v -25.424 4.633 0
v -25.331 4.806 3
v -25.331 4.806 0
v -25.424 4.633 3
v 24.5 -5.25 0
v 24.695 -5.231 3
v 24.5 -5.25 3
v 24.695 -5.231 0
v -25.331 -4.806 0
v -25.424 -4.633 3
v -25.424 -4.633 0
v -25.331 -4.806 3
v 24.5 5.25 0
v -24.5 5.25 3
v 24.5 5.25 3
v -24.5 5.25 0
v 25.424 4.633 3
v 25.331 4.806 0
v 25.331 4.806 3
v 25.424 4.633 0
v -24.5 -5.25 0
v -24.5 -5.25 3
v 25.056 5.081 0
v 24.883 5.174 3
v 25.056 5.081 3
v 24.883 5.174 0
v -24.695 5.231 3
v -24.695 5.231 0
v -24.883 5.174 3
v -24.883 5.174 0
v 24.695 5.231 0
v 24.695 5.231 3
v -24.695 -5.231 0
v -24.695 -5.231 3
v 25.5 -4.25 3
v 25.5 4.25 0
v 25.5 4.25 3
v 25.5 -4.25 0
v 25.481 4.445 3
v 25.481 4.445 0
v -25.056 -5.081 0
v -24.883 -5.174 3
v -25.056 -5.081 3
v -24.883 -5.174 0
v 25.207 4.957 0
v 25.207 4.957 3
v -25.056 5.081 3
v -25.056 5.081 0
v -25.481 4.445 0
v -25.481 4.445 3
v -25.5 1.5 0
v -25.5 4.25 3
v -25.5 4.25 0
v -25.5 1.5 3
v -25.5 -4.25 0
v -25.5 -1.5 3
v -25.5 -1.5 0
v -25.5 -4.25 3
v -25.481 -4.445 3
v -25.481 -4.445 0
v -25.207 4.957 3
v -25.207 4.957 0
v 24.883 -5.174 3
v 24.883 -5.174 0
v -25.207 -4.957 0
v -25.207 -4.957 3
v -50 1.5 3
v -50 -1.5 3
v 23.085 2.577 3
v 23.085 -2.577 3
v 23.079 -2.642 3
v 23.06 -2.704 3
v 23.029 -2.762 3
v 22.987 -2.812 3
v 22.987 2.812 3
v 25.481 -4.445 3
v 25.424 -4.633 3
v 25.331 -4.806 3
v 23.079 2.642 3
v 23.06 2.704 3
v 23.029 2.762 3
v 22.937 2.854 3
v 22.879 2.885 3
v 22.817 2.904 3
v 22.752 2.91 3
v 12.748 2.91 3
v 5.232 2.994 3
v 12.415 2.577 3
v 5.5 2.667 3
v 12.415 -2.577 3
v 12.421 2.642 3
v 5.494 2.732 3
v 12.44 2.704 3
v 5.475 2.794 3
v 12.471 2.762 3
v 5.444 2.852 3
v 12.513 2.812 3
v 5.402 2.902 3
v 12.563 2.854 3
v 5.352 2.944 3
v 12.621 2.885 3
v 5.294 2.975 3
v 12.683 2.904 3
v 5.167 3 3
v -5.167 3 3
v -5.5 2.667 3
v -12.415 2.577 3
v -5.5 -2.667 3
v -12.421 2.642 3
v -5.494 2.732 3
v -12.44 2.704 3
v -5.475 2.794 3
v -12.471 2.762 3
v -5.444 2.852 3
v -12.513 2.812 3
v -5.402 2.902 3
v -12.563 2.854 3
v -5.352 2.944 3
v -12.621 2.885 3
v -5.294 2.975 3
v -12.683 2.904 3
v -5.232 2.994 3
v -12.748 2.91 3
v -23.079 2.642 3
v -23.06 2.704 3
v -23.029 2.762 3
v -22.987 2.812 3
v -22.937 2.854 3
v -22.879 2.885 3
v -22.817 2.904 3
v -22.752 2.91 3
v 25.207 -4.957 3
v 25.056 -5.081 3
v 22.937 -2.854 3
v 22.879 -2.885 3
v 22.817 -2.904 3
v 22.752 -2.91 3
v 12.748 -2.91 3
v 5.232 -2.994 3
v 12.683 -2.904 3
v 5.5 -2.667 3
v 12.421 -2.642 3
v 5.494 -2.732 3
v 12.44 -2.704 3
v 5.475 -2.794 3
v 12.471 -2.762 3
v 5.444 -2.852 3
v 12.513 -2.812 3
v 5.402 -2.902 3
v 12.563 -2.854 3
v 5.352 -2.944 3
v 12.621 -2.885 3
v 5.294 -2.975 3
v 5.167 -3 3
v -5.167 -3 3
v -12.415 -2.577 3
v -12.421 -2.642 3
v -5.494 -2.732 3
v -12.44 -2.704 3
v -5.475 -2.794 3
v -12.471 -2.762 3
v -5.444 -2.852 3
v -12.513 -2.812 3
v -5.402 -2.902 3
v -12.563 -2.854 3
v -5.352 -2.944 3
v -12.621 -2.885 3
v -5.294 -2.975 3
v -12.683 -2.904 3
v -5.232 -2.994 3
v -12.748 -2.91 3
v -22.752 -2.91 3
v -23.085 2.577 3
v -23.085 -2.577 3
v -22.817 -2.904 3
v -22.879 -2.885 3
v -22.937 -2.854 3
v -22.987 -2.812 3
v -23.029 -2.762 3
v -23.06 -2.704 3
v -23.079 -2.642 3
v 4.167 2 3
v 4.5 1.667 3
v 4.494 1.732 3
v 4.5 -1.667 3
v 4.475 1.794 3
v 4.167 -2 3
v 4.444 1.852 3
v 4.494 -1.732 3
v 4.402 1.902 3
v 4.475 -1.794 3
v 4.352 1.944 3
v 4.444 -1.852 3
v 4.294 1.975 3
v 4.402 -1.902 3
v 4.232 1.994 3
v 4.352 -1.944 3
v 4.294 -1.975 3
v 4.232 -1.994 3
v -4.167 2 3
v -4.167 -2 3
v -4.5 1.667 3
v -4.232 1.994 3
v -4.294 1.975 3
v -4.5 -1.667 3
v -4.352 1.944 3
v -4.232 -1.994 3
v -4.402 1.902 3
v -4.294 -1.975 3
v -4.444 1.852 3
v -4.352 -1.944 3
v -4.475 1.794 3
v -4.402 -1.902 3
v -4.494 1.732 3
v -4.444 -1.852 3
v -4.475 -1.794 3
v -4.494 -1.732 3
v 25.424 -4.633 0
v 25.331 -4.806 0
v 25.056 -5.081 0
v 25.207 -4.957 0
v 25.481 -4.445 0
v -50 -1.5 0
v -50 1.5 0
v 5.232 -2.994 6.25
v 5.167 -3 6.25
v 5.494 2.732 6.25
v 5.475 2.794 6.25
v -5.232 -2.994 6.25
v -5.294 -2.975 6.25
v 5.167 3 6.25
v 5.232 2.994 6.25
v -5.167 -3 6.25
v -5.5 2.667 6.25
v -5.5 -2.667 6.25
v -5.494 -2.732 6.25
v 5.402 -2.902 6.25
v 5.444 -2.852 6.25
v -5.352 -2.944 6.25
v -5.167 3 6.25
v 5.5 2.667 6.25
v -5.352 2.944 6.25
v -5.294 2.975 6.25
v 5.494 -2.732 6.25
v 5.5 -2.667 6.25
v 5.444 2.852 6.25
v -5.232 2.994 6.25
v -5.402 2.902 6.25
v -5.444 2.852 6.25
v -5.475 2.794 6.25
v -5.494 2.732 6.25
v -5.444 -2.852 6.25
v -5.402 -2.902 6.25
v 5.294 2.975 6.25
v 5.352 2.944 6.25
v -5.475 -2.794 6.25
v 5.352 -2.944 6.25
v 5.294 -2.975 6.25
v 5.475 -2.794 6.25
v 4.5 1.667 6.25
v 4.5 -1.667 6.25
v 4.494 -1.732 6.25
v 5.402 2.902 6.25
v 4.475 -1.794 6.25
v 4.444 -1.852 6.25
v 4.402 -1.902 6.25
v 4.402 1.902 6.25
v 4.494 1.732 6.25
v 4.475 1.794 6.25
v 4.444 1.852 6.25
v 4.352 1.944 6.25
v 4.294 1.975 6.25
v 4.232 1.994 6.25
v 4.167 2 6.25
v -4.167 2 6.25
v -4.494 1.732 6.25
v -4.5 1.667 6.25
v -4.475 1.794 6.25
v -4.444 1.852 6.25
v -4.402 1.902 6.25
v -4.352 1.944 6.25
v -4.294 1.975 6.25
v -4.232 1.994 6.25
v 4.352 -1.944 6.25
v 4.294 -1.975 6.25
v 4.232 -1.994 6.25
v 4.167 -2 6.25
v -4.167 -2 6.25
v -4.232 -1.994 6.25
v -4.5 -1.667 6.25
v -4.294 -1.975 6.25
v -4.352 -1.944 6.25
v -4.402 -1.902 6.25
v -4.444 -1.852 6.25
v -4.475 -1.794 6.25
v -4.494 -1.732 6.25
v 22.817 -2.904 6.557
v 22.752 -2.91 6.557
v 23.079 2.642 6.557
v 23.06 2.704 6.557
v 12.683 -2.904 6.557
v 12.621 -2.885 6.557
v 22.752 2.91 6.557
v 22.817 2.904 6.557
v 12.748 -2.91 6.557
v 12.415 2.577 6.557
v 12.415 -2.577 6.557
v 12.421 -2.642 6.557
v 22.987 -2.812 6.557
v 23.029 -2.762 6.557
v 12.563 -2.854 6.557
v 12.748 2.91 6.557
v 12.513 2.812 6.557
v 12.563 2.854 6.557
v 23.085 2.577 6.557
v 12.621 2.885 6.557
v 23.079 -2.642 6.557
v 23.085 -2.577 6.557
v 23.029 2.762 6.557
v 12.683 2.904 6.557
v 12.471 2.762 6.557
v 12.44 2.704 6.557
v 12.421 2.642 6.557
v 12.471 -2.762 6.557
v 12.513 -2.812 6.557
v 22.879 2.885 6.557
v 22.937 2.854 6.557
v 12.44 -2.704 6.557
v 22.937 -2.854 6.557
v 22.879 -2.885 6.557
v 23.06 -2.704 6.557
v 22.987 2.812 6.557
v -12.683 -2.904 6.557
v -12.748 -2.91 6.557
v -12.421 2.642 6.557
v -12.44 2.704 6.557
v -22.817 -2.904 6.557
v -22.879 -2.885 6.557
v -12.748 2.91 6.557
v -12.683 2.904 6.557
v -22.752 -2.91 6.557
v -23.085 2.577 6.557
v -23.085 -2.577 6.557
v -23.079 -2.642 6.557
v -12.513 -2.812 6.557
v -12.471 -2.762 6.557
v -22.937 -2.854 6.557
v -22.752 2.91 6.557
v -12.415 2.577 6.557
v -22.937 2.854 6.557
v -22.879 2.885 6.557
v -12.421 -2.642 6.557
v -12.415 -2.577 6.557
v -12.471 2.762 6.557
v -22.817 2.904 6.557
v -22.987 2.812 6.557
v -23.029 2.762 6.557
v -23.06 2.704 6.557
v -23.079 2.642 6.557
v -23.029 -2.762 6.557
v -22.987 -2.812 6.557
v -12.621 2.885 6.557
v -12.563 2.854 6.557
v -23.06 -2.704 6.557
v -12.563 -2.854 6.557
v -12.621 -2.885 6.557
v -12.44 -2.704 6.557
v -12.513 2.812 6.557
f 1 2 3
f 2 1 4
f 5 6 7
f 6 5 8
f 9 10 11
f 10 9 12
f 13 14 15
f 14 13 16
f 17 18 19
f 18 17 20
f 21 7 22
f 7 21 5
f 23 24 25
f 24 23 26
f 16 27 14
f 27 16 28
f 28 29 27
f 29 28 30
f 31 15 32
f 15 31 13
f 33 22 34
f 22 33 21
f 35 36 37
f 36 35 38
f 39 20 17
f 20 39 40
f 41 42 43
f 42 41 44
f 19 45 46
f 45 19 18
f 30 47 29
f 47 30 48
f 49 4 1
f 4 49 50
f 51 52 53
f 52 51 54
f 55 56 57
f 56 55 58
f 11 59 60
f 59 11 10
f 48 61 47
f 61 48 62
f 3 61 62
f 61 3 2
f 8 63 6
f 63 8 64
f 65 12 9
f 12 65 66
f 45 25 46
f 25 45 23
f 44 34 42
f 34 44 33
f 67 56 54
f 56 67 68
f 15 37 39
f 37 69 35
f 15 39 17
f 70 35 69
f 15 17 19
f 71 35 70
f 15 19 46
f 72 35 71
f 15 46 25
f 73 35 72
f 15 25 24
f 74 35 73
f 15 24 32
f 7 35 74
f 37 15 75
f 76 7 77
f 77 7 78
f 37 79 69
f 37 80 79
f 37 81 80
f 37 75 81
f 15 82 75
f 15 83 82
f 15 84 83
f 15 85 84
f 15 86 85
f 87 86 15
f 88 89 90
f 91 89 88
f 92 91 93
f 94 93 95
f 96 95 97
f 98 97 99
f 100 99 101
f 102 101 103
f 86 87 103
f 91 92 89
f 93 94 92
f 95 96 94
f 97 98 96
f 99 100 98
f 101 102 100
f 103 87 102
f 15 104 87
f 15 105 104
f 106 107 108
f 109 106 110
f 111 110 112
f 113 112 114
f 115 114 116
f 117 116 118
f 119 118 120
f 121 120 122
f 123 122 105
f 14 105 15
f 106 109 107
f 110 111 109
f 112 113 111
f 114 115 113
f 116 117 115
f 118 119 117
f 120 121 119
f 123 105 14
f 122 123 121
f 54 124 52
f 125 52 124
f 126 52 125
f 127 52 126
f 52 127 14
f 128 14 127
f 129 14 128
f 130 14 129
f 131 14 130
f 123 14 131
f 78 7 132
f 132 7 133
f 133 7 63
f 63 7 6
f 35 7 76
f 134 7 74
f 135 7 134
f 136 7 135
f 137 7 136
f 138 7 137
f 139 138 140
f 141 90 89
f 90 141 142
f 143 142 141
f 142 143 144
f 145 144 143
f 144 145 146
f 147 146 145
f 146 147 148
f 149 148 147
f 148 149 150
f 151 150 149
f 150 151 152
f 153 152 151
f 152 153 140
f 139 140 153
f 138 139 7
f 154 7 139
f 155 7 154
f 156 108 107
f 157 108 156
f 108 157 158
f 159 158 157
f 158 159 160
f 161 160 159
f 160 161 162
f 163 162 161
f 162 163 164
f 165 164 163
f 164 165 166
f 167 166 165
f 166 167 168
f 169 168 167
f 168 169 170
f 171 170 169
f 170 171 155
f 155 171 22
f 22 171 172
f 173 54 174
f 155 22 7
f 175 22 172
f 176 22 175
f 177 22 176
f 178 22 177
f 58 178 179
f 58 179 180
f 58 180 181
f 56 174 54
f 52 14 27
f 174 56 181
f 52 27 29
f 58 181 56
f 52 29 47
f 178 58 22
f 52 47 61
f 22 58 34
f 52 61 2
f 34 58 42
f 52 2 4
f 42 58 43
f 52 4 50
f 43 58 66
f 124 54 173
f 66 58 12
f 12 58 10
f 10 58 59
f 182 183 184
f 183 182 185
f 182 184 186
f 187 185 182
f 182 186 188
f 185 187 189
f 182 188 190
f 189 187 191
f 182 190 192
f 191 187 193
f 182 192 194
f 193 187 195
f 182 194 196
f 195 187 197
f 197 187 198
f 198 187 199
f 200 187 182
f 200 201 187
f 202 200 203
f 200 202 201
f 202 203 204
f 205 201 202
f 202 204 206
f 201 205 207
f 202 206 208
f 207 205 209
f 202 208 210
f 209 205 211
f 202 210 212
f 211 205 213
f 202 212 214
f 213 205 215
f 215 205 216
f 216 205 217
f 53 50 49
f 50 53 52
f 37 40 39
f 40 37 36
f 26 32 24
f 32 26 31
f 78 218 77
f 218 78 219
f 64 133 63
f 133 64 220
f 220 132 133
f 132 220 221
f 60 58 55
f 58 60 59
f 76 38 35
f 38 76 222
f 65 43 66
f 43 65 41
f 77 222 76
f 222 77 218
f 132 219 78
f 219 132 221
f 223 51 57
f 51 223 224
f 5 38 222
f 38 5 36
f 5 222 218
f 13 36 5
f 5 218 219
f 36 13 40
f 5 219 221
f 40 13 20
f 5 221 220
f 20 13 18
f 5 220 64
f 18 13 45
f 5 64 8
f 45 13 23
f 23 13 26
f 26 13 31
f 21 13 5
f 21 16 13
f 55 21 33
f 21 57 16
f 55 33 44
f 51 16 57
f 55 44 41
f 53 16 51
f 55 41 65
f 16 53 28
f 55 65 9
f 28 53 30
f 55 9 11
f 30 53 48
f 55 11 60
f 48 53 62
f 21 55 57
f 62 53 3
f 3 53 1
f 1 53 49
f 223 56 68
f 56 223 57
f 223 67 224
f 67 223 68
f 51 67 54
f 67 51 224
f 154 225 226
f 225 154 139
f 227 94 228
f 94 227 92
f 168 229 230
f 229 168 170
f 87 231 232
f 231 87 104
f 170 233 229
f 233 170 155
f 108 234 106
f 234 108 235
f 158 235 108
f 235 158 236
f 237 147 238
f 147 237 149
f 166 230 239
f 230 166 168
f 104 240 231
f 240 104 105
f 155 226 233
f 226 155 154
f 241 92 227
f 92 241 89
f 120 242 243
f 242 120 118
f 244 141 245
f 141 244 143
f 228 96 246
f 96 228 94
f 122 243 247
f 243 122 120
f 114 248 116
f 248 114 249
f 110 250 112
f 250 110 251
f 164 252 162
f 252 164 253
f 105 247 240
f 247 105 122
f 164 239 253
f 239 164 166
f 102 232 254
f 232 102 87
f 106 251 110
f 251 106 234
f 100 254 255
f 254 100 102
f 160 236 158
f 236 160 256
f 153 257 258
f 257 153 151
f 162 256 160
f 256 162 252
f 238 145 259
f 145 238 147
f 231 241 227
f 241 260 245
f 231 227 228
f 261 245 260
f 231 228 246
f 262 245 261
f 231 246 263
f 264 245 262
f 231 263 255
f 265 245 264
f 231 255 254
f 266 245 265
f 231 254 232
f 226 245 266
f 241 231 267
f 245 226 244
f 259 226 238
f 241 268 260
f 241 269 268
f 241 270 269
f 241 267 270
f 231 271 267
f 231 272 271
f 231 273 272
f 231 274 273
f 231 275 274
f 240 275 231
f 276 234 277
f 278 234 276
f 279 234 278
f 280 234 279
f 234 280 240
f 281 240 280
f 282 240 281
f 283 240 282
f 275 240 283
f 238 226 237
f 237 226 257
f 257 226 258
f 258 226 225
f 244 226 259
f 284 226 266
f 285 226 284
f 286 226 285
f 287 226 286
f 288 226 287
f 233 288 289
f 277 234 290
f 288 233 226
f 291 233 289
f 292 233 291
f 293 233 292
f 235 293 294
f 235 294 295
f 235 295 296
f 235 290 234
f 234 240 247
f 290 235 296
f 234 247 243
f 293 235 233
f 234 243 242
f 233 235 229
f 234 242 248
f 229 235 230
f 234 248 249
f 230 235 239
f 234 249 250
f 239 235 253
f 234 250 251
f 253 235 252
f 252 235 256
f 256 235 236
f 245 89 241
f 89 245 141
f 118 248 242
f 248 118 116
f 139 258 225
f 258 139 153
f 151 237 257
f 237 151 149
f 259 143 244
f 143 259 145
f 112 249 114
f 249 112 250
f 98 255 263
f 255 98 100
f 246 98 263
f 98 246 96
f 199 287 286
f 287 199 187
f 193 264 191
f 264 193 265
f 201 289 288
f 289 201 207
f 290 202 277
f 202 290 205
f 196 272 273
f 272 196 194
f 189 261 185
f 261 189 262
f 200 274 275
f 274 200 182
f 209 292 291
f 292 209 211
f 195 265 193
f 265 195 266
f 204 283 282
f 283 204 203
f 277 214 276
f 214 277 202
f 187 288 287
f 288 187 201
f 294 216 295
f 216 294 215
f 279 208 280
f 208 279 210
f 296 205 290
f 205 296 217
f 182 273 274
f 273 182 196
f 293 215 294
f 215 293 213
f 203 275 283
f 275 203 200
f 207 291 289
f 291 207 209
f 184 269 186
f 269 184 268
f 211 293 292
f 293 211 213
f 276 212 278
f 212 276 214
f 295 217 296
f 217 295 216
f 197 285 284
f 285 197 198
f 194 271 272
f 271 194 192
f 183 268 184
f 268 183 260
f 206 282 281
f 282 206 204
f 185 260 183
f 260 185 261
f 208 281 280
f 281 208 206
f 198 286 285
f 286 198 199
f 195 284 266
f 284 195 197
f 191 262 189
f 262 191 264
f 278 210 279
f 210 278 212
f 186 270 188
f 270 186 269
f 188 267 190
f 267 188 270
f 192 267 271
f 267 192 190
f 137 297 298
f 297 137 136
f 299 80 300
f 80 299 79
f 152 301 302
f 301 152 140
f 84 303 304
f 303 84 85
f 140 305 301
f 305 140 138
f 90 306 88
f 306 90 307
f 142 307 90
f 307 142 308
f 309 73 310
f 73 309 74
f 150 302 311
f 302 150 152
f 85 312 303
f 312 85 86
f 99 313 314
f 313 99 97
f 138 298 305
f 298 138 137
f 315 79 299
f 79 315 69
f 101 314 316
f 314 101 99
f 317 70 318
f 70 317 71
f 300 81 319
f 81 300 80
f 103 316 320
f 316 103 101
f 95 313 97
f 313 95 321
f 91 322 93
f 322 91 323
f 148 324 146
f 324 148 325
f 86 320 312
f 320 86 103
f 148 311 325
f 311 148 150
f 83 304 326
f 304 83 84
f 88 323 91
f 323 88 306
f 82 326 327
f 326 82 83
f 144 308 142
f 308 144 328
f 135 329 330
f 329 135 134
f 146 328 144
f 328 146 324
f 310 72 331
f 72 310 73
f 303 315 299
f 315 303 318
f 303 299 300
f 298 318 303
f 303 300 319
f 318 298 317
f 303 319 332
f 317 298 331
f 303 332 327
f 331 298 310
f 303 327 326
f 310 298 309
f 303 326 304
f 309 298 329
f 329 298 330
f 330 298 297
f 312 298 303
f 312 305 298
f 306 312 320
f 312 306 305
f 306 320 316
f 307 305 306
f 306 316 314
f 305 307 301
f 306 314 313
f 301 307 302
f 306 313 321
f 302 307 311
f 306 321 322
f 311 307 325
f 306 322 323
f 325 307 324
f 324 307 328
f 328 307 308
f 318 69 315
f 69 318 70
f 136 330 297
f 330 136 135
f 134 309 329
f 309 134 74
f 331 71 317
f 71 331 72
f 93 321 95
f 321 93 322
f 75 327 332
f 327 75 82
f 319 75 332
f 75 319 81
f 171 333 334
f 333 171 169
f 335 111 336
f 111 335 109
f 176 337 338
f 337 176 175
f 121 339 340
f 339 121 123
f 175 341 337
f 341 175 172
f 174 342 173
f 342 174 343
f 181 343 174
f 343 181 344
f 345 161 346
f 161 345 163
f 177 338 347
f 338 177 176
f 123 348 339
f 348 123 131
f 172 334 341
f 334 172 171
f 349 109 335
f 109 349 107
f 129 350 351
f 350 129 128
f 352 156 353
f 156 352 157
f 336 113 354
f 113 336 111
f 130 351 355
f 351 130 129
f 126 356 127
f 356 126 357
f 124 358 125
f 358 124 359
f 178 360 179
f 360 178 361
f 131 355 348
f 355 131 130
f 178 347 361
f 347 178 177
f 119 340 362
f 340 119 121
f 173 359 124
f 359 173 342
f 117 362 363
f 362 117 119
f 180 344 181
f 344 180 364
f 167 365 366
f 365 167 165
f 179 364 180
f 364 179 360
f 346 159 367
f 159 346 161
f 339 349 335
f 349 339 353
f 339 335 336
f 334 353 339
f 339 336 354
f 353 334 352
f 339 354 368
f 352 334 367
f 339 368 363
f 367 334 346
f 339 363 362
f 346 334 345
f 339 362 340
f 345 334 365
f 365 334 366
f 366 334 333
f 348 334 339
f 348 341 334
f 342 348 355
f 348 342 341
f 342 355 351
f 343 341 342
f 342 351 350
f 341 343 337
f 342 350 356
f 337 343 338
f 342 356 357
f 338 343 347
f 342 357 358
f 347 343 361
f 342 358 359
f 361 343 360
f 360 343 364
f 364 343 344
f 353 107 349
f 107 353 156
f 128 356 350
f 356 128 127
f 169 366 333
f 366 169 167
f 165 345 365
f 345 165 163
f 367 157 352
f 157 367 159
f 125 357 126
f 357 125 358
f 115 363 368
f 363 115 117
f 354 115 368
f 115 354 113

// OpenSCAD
// file: rounded.scad
//
// Copyright (c) Stewart H. Whitman, 2020-2022.
//
// File:    rounded.scad
// Project: General
// License: CC BY-NC-SA 4.0 (Attribution-NonCommercial-ShareAlike)
// Desc:    Rounded square/cube/cylinder utilities
//

// rounded_side_square:
//
// Generate a square of <size> with a round-over <radius> in
// the X/Y direction. Centered optionally like a square.
//
module rounded_side_square( size, radius, center=false ) {
  assert( is_num(size) || is_list(size) );
  assert( is_num(radius) && radius >= 0 );

  c = is_list(size) ? size : [size,size];

  assert( len(c) == 2 );
  assert( is_num(c.x) );
  assert( is_num(c.y) );
  assert( c.x > 2*radius );
  assert( c.y > 2*radius );

  offset( r=radius )
    offset( delta=-radius )
      square( c, center=center );
} // end rounded_side_square

// rounded_side_cube:
//
// Generate a cube of <size> with a round-over <radius> in
// the X/Y direction. Centered optionally like a cube.
//
module rounded_side_cube( size, radius, center=false ) {
  assert( is_num(size) || is_list(size) );

  c = is_list(size) ? size : [size,size,size];

  assert( len(c) == 3 );
  assert( is_num(c.z) );

  linear_extrude( height=c.z, center=center )
    rounded_side_square( [c.x,c.y], radius, center );
} // end rounded_side_cube

// rounded_side_cube_upper:
//
// Generate a cube of <size> with a round-over <radius> in
// the X/Y direction. The object is centered on X/Y but with
// Z positive.
//
module rounded_side_cube_upper( size, radius ) {
  assert( is_num(size) || is_list(size) );

  c = is_list(size) ? size : [size,size,size];

  assert( len(c) == 3 );
  assert( is_num(c.z) );

  linear_extrude( height=c.z )
    rounded_side_square( [c.x,c.y], radius, true );
} // end rounded_side_cube_upper

// rounded_top_cylinder:
//
// Generate a cylinder with a rounded top, with <d,r,h> parameters
// like cylinder, but <radius> defines the round-over radius.
//
module rounded_top_cylinder(h,d,r,radius,center=false) {
  assert( is_num(h) && h > 0 );
  assert( (is_undef(r) || is_undef(d)) && (is_num(r) || is_num(d)) ); // Not both
  assert( is_num(radius) );
  assert( h > radius );

  cylinder_radius = is_undef(d) ? r : d/2;
  assert( cylinder_radius > radius );

  translate( [0,0,(center?-h/2:0)] )
    rotate_extrude()
      intersection() {
        offset( r=+radius ) offset( delta=-radius ) square( [ 2*cylinder_radius, 2*h ], center=true );
        square( [cylinder_radius,h] );
      }
} // end rounded_top_cylinder

// rounded_top_and_bottom_cylinder:
//
// Generate a cylinder with a rounded top and bottom, with <d,r,h> parameters
// like cylinder, but <radius> defines the round-over radius.
//
module rounded_top_and_bottom_cylinder(h,d,r,radius,center=false) {
  assert( is_num(h) && h > 0 );
  assert( (is_undef(r) || is_undef(d)) && (is_num(r) || is_num(d)) ); // Not both
  assert( is_num(radius) );
  assert( h > radius );

  cylinder_radius = is_undef(d) ? r : d/2;
  assert( cylinder_radius > radius );

  translate( [0,0,(center?-h/2:0)] )
    rotate_extrude()
      intersection() {
        translate( [-cylinder_radius, 0 ] ) offset( r=+radius ) offset( delta=-radius ) square( [ 2*cylinder_radius, h ], center=false );
	square( [cylinder_radius,h] );
      }
} // end rounded_top_and_bottom_cylinder

// rounded_top_cube:
//
// Generate a cube of <size> with a top with a round-over <radius> in
// the X/Y/Z direction. Centered optionally like a cube.
//
module rounded_top_cube(size,radius,center=false) {
  assert( is_num(size) || is_list(size) );
  assert( is_num(radius) && radius >= 0 );

  size_v = is_list(size) ? size : [size,size,size];

  rounded_top_volume( size_v, radius, center ? [0,0,0] : size_v/2 ) cube(size_v,center=center);
} // end rounded_top_cube

// rounded_top_volume:
//
// Operates on its children creating a round over effect based
// on percentage of height. Operations are:
//    1. Translate volume from <c> to origin
//    2. Scale X/Y volume down based-on the radius to be added in step 3
//    3. Minkowski with sphere adding 2*radius in all dimensions
//    4. Remove rounded over bottom radius:
//     a. Translate down a radius
//     b. Intersect with full volume
//    5. Restore volume to <c>
//
module rounded_top_volume(volume,radius,c=[0,0,0]) {
  assert( is_num(radius) && radius >= 0 );
  assert( is_list(volume) && len(volume) == 3 );
  assert( volume.x > 2*radius );
  assert( volume.y > 2*radius );

  if( radius > 0 ) {
    delta        = volume - [2*radius, 2*radius, 0];
    scale_factor = [delta.x/volume.x, delta.y/volume.y, 1 ];

    translate(c) intersection() {
      cube( volume, center=true );
      translate([0, 0, -radius ] ) minkowski() {
	scale( scale_factor ) translate(-c) children();
	sphere( r=radius );
      }
    }
  }
  else
    children();
} // end rounded_top_volume
// file: smidge.scad
//
// Copyright (c) Stewart H. Whitman, 2021-2022.
//
// File:    smidge.scad
// Project: General
// License: CC BY-NC-SA 4.0 (Attribution-NonCommercial-ShareAlike)
// Desc:    SMIDGE constant used in preview mode.
//

// Smidge constant for rendering only (to avoid Z-axis fighting, etc.)
SMIDGE = 0.01;
// main file
//
// Copyright (c) Stewart H. Whitman, 2022.
//
// File:    hp-z4-catch-top.scad
// Project: HP Z4 G4 Fan Mount
// License: CC BY-NC-SA 4.0 (Attribution-NonCommercial-ShareAlike)
// Desc:    HP Z4 G4 Top Front Fan Cage Catch Definitions
//

include <smidge.scad>;
include <rounded.scad>;

// Catch:
//
// Catch refers to the top area of the "mound". Radius
// is nominal.
//
// top_catch_size: length, width
top_catch_size = [ 51, 10.5 ];
top_catch_radius = 1;

// Slot:
//
// Two slots, centered atop the long axis and positioned
// symmetrically about the vertical center. Depth is space
// below mount.
//
// top_slot_size: length, width, depth
top_slot_size = [ 11, 6, 11 ];
top_slot_separation = 24.5;
top_slot_centers = (top_slot_separation + top_slot_size.x)/2 * [ [ 1, 0 ], [ -1, 0 ] ];

// Box:
//
// Not really part of the catch, this is the depression
// between the slots in the center of the slots.
//
top_box_size = [ 11, top_slot_size.y, 3.25 ];
top_box_center = [ 0, 0 ];
top_box_thickness = 1;

// Fitting (tolerance) properties:
//
top_tang_multiplier = 0.97;

module top_catch_tang(style) {
  size = top_tang_multiplier * top_slot_size;

  // none: nothing
  if( style == "none" ) {
    ;
  }
  // debug: just cubes (for fitting)
  else if( style == "debug" ) {
    rounded_side_cube_upper( top_slot_size, radius=0 );
  }
  // full: straight just scaled by percentage (for fitting)
  else if( style == "full" ) {
    rounded_side_cube_upper( size, top_catch_radius/3);
  }
  // short: for testing
  else if( style == "short" ) {
    rounded_side_cube_upper( [size.x,size.y,size.z/3], top_catch_radius/3);
  }
  else {
    assert( false, "top_catch_tang: style unknown!" );
  }
} // end top_catch_tang

module top_catch_base( style, height ) {
  size = concat( top_catch_size, height );

  if( style == "none" || height <= 0 ) {
    ;
  }
  // full: straight just scaled by percentage
  else if( style == "full" ) {
    rounded_side_cube_upper( size, top_catch_radius );
  }
  // layout: test out the distance to cage
  else if( style == "layout" ) {
    rounded_side_cube_upper( size, top_catch_radius );

    catch_center_to_cage = 44+6;
    translate( [-catch_center_to_cage/2,0,0] )
      rounded_side_cube_upper( [catch_center_to_cage, 3, size.z], 0 );
  }
  else {
    assert( false, "top_catch_base: style unknown!" );
  }
} // end top_catch_base

module top_catch_box(style) {
  size = top_box_size;

  // none: nothing
  if( style == "none" ) {
    ;
  }
  // debug: just flat panel
  else if( style == "debug" ) {
    translate( [0,0,size.z] )
      rounded_side_cube_upper( [ size.x, size.y, 1 ], radius=0 );
  }
  // full: just a box
  else if( style == "full" ) {
    difference() {
      rounded_side_cube_upper( size, top_catch_radius/3 );
      translate( [0,0,-SMIDGE] )
	rounded_side_cube_upper( size - 2 * [top_box_thickness, top_box_thickness, -SMIDGE ], top_catch_radius/3 );
    }
  }
  else {
    assert( false, "top_catch_box: style unknown!" );
  }
} // end top_catch_box

module top_catch_fitting(height=3,base_style="full",tang_style="full",box_style="full") {
  assert( is_num(height) && height >= 0 );

  difference() {
    union() {
      // Base
      top_catch_base( base_style, height );

      // Box
      translate( concat( top_box_center, height ) )
	top_catch_box( box_style );

      // Slot projection
      for( p = top_slot_centers )
        translate( concat( p, height ) )
          top_catch_tang( tang_style );
    }
  }
} // end top_catch_fitting

// top_catch_get_size, top_catch_get_below_size:
//
// Returns [ length, width, height above/below case ]
//
function top_catch_get_size()         = concat( top_catch_size, top_slot_size.z );
function top_catch_get_slot_size()    = top_slot_size;
function top_catch_get_slot_centers() = top_slot_centers;
function top_catch_get_box_size()     = top_box_size;
function top_catch_get_box_center()   = top_box_center;

$fn = 32;
//top_catch_fitting( height=3, base_style="full", tang_style="full");
top_catch_fitting( height=3, base_style="layout", tang_style="short", box_style="full");
